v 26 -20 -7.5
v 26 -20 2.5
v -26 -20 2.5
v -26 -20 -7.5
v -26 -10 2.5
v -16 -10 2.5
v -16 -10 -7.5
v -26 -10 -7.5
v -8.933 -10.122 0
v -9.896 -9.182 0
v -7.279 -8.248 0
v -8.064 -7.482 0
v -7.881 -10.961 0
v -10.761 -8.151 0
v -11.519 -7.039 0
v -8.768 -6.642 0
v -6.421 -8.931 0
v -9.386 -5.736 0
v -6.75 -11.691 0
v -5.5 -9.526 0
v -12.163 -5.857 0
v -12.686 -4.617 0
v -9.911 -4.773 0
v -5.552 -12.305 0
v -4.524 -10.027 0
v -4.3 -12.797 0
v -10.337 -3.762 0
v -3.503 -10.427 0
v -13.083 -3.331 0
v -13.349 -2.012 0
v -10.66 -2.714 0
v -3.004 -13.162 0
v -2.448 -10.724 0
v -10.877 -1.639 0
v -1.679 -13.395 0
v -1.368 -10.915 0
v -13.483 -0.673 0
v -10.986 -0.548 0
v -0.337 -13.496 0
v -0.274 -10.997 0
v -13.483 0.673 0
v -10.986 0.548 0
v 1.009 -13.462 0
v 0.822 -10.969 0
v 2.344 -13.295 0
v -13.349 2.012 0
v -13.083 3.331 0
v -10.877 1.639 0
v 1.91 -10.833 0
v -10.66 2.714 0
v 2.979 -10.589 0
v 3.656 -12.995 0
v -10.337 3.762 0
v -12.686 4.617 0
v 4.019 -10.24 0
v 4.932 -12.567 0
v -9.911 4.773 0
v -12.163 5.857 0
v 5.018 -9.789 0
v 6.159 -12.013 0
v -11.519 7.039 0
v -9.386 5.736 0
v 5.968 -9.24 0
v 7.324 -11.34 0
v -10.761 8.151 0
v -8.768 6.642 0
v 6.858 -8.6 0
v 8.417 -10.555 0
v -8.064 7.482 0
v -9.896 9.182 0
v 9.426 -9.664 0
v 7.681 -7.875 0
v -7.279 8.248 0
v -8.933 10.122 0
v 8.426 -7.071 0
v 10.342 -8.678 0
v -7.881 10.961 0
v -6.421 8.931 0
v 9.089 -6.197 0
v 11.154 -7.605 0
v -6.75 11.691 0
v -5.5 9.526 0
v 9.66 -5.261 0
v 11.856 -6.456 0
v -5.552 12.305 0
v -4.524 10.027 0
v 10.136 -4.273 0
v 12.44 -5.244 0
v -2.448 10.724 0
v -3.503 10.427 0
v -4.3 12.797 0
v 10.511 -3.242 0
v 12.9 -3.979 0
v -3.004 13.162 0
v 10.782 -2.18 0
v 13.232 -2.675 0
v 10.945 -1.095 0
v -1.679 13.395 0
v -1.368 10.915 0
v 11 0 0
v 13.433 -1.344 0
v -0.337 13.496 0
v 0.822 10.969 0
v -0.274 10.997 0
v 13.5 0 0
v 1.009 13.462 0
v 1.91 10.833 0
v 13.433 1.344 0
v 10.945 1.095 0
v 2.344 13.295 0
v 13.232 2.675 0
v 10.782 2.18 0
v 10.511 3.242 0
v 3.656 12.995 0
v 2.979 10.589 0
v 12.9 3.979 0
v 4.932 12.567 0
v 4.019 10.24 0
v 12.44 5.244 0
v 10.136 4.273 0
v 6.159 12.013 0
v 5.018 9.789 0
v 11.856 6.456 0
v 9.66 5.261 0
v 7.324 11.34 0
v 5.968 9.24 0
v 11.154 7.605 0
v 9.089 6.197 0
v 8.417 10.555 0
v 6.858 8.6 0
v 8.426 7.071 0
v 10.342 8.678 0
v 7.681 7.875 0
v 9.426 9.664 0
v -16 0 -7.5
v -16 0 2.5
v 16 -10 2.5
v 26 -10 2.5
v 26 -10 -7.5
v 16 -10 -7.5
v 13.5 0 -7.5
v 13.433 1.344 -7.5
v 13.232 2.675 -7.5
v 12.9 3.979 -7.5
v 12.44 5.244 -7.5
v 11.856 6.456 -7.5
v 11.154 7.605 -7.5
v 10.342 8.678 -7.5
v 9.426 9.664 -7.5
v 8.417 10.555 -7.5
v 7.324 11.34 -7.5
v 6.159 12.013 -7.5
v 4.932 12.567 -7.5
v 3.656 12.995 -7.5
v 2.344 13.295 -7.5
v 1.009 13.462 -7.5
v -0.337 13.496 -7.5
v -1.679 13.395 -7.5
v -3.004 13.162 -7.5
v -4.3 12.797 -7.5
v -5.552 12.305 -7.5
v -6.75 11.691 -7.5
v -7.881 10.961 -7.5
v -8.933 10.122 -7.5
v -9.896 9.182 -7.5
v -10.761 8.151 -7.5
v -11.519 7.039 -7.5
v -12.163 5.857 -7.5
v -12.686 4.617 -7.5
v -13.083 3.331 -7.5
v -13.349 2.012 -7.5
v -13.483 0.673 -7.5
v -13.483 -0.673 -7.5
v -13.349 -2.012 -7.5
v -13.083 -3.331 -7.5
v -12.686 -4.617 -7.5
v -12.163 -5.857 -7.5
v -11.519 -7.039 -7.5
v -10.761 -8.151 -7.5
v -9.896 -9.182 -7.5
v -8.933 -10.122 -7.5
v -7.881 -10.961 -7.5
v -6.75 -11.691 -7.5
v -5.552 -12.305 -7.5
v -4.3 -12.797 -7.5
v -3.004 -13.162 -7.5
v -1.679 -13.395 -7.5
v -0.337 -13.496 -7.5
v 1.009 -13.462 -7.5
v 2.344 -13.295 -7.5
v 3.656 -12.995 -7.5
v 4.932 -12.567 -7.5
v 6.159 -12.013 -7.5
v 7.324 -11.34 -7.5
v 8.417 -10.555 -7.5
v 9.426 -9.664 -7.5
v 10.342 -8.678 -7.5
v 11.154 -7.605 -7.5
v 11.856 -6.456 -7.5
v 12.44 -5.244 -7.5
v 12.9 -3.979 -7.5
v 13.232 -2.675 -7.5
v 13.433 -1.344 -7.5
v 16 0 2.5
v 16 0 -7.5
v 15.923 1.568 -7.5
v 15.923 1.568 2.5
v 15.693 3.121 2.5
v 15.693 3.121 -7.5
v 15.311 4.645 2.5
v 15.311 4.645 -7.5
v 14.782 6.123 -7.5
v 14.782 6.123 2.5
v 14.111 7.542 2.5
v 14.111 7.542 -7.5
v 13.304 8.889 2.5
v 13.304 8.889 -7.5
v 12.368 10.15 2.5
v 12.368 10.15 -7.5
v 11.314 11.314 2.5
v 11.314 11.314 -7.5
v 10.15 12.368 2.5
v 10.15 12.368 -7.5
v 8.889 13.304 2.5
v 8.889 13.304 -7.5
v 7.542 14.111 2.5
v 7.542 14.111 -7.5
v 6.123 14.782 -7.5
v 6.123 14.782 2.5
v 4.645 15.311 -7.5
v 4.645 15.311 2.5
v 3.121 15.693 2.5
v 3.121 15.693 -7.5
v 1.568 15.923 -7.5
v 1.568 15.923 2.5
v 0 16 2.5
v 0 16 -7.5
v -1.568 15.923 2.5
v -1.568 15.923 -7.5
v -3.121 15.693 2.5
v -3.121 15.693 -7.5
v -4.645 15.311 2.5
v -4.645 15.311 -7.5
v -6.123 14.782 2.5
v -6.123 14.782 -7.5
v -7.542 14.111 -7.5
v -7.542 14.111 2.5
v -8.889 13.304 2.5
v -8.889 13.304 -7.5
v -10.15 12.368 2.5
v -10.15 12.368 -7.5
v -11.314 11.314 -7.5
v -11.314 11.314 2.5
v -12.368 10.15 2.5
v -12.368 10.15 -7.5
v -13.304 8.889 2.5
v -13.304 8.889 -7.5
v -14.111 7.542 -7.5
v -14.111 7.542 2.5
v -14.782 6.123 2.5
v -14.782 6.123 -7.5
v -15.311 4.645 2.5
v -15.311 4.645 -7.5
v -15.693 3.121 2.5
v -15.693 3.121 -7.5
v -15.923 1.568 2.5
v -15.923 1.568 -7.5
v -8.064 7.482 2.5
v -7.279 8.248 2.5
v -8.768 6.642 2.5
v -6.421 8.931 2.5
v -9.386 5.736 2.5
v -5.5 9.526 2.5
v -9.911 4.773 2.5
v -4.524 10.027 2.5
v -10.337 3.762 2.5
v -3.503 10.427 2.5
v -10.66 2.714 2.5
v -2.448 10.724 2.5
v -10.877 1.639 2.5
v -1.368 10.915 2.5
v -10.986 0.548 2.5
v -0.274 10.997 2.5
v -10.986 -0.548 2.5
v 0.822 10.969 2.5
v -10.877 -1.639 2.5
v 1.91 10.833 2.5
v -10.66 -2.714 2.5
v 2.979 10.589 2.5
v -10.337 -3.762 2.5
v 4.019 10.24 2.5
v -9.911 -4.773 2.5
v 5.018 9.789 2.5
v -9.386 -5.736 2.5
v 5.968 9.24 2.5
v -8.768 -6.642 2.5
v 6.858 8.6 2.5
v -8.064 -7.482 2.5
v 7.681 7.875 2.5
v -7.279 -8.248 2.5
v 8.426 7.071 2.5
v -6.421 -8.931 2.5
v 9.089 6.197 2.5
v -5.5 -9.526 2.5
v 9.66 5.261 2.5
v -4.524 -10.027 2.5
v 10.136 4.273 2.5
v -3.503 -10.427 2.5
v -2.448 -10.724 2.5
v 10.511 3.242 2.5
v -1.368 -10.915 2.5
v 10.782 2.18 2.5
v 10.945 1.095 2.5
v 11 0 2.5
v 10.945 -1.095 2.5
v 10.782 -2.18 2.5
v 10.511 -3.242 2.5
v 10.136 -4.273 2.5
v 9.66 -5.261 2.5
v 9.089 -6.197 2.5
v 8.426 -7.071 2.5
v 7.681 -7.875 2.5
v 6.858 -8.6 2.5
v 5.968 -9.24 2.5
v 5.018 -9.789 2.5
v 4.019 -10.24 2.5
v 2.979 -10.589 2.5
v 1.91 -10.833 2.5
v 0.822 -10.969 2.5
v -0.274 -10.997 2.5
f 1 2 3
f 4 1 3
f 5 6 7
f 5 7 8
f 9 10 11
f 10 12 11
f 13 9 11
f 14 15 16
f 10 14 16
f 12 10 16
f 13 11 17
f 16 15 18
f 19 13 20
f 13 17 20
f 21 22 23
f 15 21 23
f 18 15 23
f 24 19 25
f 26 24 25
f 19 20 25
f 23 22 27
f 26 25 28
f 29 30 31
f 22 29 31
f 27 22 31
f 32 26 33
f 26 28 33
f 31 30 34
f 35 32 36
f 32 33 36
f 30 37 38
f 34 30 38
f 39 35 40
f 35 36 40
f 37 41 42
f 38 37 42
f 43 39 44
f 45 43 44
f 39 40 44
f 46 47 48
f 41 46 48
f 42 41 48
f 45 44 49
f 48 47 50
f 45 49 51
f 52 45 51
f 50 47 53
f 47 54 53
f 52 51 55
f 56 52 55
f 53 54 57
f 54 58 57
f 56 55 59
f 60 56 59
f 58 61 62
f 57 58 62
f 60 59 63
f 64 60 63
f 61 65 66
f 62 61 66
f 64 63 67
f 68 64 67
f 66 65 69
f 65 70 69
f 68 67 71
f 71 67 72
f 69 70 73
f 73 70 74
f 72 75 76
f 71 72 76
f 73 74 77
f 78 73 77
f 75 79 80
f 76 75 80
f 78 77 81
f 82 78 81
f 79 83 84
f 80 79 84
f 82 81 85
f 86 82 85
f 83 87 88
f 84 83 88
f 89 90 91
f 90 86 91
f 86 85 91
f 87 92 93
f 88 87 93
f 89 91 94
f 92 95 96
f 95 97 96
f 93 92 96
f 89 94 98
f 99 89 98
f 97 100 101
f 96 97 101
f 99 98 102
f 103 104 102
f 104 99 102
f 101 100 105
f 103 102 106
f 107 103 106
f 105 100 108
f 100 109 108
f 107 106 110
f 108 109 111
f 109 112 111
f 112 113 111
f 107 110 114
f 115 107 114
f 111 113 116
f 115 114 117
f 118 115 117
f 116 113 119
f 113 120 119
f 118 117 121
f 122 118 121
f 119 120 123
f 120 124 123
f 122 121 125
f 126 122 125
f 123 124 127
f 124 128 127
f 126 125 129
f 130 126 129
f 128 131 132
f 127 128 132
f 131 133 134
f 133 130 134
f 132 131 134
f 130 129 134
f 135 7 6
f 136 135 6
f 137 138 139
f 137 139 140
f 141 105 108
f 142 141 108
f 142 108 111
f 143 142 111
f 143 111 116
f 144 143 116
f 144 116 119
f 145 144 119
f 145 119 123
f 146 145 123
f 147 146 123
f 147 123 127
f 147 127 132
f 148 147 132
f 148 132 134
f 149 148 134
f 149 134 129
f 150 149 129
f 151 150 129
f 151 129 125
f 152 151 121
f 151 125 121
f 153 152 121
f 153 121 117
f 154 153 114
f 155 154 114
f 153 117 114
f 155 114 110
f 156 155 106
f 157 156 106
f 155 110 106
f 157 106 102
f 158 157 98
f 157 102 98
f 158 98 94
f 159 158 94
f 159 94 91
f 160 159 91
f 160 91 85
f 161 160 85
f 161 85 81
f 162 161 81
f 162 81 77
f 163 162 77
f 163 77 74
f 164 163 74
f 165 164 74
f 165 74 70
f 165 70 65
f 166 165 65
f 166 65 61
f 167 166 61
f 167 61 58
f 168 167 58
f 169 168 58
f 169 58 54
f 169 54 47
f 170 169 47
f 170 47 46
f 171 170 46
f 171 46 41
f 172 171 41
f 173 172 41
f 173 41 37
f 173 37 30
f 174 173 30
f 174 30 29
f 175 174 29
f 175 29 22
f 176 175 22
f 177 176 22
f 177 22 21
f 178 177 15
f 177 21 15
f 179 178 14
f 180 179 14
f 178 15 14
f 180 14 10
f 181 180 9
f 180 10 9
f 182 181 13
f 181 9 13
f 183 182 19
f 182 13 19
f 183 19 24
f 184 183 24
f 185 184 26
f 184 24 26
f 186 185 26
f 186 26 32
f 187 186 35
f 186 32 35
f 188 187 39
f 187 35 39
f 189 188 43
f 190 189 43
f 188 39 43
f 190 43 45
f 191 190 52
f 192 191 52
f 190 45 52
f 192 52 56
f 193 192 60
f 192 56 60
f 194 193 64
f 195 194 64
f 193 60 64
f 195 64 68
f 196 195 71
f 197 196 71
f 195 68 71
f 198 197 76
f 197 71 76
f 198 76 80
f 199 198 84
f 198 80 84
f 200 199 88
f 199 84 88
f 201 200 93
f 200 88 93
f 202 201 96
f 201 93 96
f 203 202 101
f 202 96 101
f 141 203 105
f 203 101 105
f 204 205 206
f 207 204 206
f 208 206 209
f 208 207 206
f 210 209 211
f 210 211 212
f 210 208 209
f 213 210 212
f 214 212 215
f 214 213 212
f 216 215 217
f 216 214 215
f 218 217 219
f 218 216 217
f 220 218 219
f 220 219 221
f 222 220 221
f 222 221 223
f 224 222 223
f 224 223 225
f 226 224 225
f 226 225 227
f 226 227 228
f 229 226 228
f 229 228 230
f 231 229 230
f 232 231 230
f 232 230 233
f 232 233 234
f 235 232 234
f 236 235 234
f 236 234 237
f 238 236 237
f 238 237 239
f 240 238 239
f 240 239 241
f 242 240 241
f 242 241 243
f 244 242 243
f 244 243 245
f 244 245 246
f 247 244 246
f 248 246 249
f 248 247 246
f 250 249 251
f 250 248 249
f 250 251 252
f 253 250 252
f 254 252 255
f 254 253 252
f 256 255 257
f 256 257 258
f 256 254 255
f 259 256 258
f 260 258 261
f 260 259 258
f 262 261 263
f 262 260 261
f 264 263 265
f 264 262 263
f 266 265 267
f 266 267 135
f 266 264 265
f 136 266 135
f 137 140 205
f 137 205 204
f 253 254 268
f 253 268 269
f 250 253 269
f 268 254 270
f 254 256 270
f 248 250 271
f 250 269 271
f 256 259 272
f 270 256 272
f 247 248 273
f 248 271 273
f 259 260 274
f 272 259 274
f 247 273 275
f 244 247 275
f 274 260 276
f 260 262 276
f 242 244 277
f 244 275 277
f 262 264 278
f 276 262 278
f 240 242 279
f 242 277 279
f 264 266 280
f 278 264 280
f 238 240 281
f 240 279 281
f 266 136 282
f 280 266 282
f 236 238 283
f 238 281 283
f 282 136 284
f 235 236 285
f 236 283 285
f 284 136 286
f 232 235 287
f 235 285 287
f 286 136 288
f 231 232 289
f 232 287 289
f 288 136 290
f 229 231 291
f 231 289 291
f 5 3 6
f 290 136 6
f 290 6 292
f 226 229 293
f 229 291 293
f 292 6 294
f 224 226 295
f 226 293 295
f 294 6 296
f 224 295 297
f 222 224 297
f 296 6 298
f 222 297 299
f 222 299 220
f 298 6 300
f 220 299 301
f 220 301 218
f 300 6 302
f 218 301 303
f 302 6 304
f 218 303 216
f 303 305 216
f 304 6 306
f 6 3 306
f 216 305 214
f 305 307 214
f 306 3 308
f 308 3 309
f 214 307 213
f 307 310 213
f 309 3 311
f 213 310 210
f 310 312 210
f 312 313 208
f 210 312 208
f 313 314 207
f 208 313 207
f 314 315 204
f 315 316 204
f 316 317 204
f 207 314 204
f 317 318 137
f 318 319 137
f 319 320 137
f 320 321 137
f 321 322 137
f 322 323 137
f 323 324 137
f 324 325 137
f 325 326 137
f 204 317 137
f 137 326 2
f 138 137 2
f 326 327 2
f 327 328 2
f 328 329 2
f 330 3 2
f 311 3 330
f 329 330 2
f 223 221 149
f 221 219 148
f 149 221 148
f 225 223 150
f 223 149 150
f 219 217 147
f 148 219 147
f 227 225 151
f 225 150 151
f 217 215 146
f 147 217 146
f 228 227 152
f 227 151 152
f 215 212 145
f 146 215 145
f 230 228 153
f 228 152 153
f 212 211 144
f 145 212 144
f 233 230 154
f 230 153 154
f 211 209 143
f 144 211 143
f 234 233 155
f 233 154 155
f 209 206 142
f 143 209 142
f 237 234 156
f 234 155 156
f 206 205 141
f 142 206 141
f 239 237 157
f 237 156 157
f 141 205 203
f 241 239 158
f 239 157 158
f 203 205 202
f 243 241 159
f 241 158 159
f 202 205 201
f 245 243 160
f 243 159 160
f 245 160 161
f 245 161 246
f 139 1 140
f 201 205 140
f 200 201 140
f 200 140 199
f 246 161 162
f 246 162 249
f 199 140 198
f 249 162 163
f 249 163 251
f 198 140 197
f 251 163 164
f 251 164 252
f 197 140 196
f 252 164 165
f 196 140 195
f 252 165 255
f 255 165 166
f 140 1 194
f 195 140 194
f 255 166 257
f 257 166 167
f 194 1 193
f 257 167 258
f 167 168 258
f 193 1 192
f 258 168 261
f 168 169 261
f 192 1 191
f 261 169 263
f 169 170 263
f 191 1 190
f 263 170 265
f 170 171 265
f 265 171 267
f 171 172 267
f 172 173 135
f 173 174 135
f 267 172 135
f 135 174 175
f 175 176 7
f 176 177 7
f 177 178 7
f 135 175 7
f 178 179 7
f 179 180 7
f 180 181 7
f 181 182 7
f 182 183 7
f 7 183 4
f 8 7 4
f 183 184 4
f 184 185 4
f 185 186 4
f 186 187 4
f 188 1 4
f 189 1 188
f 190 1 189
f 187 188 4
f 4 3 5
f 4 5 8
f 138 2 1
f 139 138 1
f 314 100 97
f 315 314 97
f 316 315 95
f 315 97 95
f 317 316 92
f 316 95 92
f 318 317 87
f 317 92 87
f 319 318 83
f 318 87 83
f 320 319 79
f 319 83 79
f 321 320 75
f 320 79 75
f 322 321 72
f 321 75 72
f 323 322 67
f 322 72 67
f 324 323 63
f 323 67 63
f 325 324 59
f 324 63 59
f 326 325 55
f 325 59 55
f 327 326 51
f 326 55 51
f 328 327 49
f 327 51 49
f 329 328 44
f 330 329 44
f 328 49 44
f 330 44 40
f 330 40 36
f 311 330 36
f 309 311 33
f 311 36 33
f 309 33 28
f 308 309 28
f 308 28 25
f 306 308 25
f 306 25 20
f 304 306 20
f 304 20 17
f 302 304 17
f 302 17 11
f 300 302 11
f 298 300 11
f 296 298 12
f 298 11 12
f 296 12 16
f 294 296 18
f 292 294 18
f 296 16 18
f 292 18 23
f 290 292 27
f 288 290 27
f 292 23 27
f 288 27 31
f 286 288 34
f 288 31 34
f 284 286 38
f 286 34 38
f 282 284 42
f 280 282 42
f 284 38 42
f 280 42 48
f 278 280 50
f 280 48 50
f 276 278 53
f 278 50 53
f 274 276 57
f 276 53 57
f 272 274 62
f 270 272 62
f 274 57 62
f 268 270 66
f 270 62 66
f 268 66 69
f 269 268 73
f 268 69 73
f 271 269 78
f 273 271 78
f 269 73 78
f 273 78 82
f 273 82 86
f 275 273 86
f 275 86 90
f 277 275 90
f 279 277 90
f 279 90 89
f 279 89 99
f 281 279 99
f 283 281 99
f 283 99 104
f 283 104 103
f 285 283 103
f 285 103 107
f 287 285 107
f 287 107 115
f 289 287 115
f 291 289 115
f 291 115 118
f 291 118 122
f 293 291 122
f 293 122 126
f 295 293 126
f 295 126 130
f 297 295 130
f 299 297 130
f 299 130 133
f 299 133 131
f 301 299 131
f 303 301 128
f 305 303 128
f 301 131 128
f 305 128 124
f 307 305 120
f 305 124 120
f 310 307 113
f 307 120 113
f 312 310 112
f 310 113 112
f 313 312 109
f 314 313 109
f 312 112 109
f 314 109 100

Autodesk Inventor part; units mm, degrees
ref_plane "YZ Plane" through (0, 0, 0) normal (1, 0, 0) x (0, 1, 0)
ref_plane "XY Plane" through (0, 0, 0) normal (0, 0, 1) x (1, 0, 0)
sketch "Sketch1" plane through (0, 0, 0) normal (0, 0, 1) x (1, 0, 0)
  circle A0 centre (0, 0) radius 13.5
  circle A1 centre (0, 0) radius 16
  circle A2 centre (0, 0) radius 11
  dimension "d0" = 27
  dimension "d1" = 32
  dimension "d2" = 22
extrude "Extrusion1" add sketch "Sketch1" along normal blind 2.5 contours A0 | A1
extrude "Extrusion2" add sketch "Sketch1" against normal blind 7.5 contours A1
ref_plane "Work Plane1" through (0, -20, 0) normal (0, 1, 0) x (-1, 0, 0)
sketch "Sketch2" plane through (0, -20, 0) normal (0, 1, 0) x (-1, 0, 0)
  line L0 (-16, -7.5) -> (16, -7.5) projected
  line L1 (16, 2.5) -> (-16, 2.5) projected
  line L2 (16, -7.5) -> (16, 2.5) projected
  line L3 (-16, -7.5) -> (-16, 2.5) projected
  line L4 (-16, 2.5) -> (-26, 2.5)
  line L5 (-26, 2.5) -> (-26, -7.5)
  line L6 (-26, -7.5) -> (-16, -7.5)
  line L7 (-16, -7.5) -> (-16, 2.5)
  line L8 (16, 2.5) -> (26, 2.5)
  line L9 (26, 2.5) -> (26, -7.5)
  line L10 (26, -7.5) -> (16, -7.5)
  line L11 (16, -7.5) -> (16, 2.5)
  point P0 (0, 0)
  dimension "d8" = 10
  dimension "d9" = 10
  dimension "d10" = 10
  dimension "d11" = 10
extrude "Extrusion3" add sketch "Sketch2" along normal blind 20 contours L3 L1 L2 L0
delete faces "Delete Face1" heal yes whole lump no faces at (3.6667, 0, -5)
extrude "Extrusion4" add sketch "Sketch2" along normal blind 10 contours L6 L5 L4 L3 | L2 L8 L9 L10
properties part number "Adafruit_1528_4699_ND_House_02"
